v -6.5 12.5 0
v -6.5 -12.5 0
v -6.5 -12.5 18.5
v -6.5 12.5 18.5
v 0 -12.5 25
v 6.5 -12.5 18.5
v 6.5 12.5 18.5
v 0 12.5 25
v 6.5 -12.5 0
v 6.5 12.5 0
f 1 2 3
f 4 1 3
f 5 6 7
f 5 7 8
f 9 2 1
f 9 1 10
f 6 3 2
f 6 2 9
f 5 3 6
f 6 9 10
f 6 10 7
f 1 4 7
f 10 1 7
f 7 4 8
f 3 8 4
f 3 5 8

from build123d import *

# Parameters (mm, degrees)
F0_W     = 13
F0_H     = 18.5
F1_DEPTH = 12.5


with BuildPart() as f1:
    # F0 (on Front) → F1 (new body, symmetric)
    with BuildSketch(Plane.XZ):
        with Locations((0, 9.25)):
            Rectangle(F0_W, F0_H)
        Polygon((0, 25), (-6.5, 18.5), (6.5, 18.5), align=None)
    extrude(amount=F1_DEPTH, both=True)


solid = f1.part
